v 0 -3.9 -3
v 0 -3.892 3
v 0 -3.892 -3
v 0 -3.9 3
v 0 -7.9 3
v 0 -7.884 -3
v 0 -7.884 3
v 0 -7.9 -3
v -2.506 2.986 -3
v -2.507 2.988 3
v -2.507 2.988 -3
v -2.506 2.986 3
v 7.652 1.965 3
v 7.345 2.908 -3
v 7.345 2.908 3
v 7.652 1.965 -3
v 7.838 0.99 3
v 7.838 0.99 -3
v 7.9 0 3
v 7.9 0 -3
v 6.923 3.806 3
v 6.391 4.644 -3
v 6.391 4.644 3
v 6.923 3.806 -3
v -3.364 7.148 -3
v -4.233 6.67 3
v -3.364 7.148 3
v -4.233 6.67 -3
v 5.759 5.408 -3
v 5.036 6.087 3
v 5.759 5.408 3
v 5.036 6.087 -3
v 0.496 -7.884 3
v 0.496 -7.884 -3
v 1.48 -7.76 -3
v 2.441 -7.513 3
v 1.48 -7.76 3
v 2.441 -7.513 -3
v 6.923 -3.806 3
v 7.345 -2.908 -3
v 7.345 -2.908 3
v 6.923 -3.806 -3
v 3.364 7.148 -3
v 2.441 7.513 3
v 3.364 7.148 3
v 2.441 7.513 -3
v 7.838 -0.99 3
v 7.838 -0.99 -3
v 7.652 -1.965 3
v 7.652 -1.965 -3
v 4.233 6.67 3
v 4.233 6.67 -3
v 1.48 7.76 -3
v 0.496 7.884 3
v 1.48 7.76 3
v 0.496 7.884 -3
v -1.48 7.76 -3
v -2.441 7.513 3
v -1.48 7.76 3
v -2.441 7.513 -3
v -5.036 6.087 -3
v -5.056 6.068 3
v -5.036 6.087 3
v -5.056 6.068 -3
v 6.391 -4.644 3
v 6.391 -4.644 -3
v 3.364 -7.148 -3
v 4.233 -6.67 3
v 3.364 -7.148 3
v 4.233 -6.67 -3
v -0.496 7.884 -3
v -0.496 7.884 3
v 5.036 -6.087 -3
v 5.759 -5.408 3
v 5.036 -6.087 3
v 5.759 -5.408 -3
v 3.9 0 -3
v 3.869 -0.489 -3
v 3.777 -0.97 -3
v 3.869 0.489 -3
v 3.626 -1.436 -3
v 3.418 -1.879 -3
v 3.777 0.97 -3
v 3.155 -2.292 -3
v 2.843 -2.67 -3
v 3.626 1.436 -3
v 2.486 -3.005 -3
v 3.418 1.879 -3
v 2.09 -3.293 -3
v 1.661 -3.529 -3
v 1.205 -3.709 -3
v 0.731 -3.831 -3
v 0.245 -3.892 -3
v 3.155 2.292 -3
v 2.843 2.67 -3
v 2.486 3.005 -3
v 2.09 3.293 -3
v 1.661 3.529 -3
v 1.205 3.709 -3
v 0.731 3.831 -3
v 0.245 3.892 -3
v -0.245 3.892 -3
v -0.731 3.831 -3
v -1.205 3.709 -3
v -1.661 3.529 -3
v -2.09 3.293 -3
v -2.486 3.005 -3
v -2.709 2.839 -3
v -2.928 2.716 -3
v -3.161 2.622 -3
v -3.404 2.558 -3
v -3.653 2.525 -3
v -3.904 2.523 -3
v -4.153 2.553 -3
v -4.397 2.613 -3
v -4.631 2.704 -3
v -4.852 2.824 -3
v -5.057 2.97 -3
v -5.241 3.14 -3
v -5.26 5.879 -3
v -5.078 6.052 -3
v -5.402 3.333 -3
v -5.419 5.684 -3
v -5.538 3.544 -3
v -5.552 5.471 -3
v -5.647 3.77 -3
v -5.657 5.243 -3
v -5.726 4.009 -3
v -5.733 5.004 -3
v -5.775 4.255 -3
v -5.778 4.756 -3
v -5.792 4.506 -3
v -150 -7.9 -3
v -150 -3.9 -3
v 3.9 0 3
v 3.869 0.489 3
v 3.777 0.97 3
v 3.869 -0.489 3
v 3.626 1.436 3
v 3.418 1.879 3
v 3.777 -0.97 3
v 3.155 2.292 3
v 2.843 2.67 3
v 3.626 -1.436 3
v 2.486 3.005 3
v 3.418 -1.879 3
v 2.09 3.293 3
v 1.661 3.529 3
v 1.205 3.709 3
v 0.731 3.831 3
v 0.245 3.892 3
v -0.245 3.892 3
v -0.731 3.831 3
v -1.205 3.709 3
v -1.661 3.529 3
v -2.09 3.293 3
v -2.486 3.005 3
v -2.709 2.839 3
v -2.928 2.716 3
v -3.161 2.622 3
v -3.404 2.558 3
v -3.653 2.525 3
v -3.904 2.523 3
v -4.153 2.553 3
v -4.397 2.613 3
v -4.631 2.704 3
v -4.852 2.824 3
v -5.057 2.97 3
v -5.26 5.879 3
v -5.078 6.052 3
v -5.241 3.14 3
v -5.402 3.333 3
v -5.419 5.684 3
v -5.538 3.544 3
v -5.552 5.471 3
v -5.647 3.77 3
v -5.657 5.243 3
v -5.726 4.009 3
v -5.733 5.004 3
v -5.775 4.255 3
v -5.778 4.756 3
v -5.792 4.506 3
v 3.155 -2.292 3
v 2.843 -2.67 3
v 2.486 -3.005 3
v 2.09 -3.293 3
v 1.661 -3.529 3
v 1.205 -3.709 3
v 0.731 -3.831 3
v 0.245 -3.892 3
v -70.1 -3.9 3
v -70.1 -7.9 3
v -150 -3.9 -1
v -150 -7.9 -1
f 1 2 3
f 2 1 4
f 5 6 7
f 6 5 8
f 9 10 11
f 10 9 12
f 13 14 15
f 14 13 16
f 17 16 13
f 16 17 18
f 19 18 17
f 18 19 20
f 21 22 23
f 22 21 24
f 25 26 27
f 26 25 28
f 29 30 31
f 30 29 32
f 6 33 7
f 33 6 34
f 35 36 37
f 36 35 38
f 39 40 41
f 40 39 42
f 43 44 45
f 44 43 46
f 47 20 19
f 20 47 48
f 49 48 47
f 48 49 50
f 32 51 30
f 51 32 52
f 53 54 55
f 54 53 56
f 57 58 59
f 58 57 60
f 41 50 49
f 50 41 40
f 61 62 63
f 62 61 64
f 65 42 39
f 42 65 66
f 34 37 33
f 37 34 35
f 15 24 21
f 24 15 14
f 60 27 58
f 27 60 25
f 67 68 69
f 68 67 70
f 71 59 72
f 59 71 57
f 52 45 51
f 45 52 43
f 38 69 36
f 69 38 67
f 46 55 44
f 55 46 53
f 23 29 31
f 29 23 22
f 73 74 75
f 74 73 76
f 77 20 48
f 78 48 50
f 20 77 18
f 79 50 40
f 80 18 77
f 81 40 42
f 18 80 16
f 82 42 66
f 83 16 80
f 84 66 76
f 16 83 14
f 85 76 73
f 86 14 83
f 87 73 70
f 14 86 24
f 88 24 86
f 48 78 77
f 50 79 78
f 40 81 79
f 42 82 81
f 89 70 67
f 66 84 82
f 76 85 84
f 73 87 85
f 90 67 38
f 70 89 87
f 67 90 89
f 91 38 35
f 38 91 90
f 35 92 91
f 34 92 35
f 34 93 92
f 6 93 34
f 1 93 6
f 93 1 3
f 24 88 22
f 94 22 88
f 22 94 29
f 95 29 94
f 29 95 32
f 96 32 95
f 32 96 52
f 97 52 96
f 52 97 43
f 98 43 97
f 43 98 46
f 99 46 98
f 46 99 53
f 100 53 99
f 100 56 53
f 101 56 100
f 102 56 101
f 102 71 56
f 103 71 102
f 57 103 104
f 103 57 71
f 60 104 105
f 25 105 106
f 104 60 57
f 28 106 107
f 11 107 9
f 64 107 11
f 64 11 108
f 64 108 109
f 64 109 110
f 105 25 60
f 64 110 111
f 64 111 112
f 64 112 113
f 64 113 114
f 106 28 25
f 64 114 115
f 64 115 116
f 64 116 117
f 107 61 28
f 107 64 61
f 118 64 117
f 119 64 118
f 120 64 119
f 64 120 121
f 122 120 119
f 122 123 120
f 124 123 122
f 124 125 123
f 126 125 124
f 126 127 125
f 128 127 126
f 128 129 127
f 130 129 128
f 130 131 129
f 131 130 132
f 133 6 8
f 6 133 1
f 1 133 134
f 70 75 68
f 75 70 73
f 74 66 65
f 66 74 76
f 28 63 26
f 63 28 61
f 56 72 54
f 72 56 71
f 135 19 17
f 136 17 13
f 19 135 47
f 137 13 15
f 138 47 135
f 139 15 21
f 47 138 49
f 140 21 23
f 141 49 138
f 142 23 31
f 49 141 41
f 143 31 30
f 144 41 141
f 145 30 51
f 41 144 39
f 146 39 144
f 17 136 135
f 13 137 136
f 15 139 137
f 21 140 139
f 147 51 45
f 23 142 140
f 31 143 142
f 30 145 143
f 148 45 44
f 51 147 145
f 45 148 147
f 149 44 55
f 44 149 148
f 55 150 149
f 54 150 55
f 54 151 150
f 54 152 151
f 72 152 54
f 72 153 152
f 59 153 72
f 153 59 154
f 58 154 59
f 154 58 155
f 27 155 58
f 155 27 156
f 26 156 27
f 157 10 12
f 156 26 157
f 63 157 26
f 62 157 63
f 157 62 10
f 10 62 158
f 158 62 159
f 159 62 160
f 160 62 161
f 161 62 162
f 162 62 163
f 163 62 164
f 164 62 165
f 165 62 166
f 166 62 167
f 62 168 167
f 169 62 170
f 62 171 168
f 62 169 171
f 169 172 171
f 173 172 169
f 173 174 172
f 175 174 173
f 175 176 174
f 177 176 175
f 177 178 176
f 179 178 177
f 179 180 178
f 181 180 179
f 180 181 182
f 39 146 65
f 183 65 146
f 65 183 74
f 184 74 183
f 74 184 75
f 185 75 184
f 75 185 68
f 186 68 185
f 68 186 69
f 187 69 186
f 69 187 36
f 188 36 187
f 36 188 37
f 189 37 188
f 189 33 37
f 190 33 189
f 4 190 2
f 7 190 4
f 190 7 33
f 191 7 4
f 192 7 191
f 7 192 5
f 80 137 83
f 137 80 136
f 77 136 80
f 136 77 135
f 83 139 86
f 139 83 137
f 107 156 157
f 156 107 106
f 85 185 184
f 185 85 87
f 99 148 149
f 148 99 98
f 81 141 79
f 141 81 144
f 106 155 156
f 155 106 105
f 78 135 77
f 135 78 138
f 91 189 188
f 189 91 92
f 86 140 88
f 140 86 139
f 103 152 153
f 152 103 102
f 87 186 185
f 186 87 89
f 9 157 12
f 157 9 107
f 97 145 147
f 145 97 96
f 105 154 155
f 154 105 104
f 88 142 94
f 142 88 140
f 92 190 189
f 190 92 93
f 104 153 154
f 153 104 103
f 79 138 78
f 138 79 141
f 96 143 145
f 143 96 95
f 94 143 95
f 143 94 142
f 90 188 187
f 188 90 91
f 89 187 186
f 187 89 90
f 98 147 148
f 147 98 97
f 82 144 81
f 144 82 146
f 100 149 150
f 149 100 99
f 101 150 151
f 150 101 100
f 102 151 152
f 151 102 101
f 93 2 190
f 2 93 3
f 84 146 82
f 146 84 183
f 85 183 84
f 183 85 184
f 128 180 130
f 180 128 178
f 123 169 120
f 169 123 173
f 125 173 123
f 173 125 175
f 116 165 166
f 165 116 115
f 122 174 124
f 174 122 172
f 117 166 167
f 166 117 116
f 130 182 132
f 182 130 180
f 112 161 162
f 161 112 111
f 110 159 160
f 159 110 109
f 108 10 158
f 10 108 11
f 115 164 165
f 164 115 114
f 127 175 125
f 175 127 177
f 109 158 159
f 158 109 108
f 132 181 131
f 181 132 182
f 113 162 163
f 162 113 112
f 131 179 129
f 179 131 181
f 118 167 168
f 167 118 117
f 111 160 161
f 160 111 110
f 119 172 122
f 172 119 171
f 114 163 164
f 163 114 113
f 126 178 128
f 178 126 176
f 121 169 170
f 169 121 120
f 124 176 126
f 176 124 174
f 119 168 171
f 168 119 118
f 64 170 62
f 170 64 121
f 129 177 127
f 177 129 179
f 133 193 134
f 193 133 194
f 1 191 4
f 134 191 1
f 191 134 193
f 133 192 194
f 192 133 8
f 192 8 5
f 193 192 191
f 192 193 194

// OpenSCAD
// inner diameter in mm (hose outer diameter)
inner_diameter = 7.8;

//holder ring thickness in mm
holder_thickness = 4;

//holder width in mm (height of 3d print actually)
holder_width = 6;

//pin length in mm
pin_length = 150;

//bottom pin width in mm
ping_bottom_width = 2;

//length of pin slope
slope_length = 80;

//holder arc in degrees
holder_arc=140;

$fn=50;

holder_ring();
pin();


module pin() {
	difference() {
		translate([-pin_length,-inner_diameter/2 -holder_thickness ,-holder_width/2])
			cube([pin_length, holder_thickness, holder_width]);
		translate([-pin_length,-inner_diameter/2 -holder_thickness -0.1 ,-holder_width/2+ping_bottom_width])
			rotate([0,-asin((holder_width-ping_bottom_width)/slope_length),0])
	  			cube([slope_length, holder_thickness+0.2, holder_width]);
	}
	
}

module holder_ring () {

	difference() {
		cylinder(d=inner_diameter+2*holder_thickness,h=holder_width, center=true);
		cylinder(d=inner_diameter,h=holder_width+ 0.2, center=true);
		translate([0,0,-holder_width/2-0.1])
			arc(inner_diameter+20, holder_width + 0.2, inner_diameter+20, holder_arc);

	}
	rotate([0,0,-190+holder_arc])
		translate([-inner_diameter/2 -holder_thickness/2,0,0])
			cylinder(d=holder_thickness,h=holder_width, center=true);
}


module arc( height, depth, radius, degrees ) {
    render() {
        difference() {
            // Outer ring
            rotate_extrude($fn = 100)
                translate([radius - height, 0, 0])
                    square([height,depth]);
         
            // Cut half off
            translate([0,-(radius+1),-.5]) 
                cube ([radius+1,(radius+1)*2,depth+1]);
         
            // Cover the other half as necessary
            rotate([0,0,180-degrees])
            translate([0,-(radius+1),-.5]) 
                cube ([radius+1,(radius+1)*2,depth+1]);
         
        }
    }
}
 
